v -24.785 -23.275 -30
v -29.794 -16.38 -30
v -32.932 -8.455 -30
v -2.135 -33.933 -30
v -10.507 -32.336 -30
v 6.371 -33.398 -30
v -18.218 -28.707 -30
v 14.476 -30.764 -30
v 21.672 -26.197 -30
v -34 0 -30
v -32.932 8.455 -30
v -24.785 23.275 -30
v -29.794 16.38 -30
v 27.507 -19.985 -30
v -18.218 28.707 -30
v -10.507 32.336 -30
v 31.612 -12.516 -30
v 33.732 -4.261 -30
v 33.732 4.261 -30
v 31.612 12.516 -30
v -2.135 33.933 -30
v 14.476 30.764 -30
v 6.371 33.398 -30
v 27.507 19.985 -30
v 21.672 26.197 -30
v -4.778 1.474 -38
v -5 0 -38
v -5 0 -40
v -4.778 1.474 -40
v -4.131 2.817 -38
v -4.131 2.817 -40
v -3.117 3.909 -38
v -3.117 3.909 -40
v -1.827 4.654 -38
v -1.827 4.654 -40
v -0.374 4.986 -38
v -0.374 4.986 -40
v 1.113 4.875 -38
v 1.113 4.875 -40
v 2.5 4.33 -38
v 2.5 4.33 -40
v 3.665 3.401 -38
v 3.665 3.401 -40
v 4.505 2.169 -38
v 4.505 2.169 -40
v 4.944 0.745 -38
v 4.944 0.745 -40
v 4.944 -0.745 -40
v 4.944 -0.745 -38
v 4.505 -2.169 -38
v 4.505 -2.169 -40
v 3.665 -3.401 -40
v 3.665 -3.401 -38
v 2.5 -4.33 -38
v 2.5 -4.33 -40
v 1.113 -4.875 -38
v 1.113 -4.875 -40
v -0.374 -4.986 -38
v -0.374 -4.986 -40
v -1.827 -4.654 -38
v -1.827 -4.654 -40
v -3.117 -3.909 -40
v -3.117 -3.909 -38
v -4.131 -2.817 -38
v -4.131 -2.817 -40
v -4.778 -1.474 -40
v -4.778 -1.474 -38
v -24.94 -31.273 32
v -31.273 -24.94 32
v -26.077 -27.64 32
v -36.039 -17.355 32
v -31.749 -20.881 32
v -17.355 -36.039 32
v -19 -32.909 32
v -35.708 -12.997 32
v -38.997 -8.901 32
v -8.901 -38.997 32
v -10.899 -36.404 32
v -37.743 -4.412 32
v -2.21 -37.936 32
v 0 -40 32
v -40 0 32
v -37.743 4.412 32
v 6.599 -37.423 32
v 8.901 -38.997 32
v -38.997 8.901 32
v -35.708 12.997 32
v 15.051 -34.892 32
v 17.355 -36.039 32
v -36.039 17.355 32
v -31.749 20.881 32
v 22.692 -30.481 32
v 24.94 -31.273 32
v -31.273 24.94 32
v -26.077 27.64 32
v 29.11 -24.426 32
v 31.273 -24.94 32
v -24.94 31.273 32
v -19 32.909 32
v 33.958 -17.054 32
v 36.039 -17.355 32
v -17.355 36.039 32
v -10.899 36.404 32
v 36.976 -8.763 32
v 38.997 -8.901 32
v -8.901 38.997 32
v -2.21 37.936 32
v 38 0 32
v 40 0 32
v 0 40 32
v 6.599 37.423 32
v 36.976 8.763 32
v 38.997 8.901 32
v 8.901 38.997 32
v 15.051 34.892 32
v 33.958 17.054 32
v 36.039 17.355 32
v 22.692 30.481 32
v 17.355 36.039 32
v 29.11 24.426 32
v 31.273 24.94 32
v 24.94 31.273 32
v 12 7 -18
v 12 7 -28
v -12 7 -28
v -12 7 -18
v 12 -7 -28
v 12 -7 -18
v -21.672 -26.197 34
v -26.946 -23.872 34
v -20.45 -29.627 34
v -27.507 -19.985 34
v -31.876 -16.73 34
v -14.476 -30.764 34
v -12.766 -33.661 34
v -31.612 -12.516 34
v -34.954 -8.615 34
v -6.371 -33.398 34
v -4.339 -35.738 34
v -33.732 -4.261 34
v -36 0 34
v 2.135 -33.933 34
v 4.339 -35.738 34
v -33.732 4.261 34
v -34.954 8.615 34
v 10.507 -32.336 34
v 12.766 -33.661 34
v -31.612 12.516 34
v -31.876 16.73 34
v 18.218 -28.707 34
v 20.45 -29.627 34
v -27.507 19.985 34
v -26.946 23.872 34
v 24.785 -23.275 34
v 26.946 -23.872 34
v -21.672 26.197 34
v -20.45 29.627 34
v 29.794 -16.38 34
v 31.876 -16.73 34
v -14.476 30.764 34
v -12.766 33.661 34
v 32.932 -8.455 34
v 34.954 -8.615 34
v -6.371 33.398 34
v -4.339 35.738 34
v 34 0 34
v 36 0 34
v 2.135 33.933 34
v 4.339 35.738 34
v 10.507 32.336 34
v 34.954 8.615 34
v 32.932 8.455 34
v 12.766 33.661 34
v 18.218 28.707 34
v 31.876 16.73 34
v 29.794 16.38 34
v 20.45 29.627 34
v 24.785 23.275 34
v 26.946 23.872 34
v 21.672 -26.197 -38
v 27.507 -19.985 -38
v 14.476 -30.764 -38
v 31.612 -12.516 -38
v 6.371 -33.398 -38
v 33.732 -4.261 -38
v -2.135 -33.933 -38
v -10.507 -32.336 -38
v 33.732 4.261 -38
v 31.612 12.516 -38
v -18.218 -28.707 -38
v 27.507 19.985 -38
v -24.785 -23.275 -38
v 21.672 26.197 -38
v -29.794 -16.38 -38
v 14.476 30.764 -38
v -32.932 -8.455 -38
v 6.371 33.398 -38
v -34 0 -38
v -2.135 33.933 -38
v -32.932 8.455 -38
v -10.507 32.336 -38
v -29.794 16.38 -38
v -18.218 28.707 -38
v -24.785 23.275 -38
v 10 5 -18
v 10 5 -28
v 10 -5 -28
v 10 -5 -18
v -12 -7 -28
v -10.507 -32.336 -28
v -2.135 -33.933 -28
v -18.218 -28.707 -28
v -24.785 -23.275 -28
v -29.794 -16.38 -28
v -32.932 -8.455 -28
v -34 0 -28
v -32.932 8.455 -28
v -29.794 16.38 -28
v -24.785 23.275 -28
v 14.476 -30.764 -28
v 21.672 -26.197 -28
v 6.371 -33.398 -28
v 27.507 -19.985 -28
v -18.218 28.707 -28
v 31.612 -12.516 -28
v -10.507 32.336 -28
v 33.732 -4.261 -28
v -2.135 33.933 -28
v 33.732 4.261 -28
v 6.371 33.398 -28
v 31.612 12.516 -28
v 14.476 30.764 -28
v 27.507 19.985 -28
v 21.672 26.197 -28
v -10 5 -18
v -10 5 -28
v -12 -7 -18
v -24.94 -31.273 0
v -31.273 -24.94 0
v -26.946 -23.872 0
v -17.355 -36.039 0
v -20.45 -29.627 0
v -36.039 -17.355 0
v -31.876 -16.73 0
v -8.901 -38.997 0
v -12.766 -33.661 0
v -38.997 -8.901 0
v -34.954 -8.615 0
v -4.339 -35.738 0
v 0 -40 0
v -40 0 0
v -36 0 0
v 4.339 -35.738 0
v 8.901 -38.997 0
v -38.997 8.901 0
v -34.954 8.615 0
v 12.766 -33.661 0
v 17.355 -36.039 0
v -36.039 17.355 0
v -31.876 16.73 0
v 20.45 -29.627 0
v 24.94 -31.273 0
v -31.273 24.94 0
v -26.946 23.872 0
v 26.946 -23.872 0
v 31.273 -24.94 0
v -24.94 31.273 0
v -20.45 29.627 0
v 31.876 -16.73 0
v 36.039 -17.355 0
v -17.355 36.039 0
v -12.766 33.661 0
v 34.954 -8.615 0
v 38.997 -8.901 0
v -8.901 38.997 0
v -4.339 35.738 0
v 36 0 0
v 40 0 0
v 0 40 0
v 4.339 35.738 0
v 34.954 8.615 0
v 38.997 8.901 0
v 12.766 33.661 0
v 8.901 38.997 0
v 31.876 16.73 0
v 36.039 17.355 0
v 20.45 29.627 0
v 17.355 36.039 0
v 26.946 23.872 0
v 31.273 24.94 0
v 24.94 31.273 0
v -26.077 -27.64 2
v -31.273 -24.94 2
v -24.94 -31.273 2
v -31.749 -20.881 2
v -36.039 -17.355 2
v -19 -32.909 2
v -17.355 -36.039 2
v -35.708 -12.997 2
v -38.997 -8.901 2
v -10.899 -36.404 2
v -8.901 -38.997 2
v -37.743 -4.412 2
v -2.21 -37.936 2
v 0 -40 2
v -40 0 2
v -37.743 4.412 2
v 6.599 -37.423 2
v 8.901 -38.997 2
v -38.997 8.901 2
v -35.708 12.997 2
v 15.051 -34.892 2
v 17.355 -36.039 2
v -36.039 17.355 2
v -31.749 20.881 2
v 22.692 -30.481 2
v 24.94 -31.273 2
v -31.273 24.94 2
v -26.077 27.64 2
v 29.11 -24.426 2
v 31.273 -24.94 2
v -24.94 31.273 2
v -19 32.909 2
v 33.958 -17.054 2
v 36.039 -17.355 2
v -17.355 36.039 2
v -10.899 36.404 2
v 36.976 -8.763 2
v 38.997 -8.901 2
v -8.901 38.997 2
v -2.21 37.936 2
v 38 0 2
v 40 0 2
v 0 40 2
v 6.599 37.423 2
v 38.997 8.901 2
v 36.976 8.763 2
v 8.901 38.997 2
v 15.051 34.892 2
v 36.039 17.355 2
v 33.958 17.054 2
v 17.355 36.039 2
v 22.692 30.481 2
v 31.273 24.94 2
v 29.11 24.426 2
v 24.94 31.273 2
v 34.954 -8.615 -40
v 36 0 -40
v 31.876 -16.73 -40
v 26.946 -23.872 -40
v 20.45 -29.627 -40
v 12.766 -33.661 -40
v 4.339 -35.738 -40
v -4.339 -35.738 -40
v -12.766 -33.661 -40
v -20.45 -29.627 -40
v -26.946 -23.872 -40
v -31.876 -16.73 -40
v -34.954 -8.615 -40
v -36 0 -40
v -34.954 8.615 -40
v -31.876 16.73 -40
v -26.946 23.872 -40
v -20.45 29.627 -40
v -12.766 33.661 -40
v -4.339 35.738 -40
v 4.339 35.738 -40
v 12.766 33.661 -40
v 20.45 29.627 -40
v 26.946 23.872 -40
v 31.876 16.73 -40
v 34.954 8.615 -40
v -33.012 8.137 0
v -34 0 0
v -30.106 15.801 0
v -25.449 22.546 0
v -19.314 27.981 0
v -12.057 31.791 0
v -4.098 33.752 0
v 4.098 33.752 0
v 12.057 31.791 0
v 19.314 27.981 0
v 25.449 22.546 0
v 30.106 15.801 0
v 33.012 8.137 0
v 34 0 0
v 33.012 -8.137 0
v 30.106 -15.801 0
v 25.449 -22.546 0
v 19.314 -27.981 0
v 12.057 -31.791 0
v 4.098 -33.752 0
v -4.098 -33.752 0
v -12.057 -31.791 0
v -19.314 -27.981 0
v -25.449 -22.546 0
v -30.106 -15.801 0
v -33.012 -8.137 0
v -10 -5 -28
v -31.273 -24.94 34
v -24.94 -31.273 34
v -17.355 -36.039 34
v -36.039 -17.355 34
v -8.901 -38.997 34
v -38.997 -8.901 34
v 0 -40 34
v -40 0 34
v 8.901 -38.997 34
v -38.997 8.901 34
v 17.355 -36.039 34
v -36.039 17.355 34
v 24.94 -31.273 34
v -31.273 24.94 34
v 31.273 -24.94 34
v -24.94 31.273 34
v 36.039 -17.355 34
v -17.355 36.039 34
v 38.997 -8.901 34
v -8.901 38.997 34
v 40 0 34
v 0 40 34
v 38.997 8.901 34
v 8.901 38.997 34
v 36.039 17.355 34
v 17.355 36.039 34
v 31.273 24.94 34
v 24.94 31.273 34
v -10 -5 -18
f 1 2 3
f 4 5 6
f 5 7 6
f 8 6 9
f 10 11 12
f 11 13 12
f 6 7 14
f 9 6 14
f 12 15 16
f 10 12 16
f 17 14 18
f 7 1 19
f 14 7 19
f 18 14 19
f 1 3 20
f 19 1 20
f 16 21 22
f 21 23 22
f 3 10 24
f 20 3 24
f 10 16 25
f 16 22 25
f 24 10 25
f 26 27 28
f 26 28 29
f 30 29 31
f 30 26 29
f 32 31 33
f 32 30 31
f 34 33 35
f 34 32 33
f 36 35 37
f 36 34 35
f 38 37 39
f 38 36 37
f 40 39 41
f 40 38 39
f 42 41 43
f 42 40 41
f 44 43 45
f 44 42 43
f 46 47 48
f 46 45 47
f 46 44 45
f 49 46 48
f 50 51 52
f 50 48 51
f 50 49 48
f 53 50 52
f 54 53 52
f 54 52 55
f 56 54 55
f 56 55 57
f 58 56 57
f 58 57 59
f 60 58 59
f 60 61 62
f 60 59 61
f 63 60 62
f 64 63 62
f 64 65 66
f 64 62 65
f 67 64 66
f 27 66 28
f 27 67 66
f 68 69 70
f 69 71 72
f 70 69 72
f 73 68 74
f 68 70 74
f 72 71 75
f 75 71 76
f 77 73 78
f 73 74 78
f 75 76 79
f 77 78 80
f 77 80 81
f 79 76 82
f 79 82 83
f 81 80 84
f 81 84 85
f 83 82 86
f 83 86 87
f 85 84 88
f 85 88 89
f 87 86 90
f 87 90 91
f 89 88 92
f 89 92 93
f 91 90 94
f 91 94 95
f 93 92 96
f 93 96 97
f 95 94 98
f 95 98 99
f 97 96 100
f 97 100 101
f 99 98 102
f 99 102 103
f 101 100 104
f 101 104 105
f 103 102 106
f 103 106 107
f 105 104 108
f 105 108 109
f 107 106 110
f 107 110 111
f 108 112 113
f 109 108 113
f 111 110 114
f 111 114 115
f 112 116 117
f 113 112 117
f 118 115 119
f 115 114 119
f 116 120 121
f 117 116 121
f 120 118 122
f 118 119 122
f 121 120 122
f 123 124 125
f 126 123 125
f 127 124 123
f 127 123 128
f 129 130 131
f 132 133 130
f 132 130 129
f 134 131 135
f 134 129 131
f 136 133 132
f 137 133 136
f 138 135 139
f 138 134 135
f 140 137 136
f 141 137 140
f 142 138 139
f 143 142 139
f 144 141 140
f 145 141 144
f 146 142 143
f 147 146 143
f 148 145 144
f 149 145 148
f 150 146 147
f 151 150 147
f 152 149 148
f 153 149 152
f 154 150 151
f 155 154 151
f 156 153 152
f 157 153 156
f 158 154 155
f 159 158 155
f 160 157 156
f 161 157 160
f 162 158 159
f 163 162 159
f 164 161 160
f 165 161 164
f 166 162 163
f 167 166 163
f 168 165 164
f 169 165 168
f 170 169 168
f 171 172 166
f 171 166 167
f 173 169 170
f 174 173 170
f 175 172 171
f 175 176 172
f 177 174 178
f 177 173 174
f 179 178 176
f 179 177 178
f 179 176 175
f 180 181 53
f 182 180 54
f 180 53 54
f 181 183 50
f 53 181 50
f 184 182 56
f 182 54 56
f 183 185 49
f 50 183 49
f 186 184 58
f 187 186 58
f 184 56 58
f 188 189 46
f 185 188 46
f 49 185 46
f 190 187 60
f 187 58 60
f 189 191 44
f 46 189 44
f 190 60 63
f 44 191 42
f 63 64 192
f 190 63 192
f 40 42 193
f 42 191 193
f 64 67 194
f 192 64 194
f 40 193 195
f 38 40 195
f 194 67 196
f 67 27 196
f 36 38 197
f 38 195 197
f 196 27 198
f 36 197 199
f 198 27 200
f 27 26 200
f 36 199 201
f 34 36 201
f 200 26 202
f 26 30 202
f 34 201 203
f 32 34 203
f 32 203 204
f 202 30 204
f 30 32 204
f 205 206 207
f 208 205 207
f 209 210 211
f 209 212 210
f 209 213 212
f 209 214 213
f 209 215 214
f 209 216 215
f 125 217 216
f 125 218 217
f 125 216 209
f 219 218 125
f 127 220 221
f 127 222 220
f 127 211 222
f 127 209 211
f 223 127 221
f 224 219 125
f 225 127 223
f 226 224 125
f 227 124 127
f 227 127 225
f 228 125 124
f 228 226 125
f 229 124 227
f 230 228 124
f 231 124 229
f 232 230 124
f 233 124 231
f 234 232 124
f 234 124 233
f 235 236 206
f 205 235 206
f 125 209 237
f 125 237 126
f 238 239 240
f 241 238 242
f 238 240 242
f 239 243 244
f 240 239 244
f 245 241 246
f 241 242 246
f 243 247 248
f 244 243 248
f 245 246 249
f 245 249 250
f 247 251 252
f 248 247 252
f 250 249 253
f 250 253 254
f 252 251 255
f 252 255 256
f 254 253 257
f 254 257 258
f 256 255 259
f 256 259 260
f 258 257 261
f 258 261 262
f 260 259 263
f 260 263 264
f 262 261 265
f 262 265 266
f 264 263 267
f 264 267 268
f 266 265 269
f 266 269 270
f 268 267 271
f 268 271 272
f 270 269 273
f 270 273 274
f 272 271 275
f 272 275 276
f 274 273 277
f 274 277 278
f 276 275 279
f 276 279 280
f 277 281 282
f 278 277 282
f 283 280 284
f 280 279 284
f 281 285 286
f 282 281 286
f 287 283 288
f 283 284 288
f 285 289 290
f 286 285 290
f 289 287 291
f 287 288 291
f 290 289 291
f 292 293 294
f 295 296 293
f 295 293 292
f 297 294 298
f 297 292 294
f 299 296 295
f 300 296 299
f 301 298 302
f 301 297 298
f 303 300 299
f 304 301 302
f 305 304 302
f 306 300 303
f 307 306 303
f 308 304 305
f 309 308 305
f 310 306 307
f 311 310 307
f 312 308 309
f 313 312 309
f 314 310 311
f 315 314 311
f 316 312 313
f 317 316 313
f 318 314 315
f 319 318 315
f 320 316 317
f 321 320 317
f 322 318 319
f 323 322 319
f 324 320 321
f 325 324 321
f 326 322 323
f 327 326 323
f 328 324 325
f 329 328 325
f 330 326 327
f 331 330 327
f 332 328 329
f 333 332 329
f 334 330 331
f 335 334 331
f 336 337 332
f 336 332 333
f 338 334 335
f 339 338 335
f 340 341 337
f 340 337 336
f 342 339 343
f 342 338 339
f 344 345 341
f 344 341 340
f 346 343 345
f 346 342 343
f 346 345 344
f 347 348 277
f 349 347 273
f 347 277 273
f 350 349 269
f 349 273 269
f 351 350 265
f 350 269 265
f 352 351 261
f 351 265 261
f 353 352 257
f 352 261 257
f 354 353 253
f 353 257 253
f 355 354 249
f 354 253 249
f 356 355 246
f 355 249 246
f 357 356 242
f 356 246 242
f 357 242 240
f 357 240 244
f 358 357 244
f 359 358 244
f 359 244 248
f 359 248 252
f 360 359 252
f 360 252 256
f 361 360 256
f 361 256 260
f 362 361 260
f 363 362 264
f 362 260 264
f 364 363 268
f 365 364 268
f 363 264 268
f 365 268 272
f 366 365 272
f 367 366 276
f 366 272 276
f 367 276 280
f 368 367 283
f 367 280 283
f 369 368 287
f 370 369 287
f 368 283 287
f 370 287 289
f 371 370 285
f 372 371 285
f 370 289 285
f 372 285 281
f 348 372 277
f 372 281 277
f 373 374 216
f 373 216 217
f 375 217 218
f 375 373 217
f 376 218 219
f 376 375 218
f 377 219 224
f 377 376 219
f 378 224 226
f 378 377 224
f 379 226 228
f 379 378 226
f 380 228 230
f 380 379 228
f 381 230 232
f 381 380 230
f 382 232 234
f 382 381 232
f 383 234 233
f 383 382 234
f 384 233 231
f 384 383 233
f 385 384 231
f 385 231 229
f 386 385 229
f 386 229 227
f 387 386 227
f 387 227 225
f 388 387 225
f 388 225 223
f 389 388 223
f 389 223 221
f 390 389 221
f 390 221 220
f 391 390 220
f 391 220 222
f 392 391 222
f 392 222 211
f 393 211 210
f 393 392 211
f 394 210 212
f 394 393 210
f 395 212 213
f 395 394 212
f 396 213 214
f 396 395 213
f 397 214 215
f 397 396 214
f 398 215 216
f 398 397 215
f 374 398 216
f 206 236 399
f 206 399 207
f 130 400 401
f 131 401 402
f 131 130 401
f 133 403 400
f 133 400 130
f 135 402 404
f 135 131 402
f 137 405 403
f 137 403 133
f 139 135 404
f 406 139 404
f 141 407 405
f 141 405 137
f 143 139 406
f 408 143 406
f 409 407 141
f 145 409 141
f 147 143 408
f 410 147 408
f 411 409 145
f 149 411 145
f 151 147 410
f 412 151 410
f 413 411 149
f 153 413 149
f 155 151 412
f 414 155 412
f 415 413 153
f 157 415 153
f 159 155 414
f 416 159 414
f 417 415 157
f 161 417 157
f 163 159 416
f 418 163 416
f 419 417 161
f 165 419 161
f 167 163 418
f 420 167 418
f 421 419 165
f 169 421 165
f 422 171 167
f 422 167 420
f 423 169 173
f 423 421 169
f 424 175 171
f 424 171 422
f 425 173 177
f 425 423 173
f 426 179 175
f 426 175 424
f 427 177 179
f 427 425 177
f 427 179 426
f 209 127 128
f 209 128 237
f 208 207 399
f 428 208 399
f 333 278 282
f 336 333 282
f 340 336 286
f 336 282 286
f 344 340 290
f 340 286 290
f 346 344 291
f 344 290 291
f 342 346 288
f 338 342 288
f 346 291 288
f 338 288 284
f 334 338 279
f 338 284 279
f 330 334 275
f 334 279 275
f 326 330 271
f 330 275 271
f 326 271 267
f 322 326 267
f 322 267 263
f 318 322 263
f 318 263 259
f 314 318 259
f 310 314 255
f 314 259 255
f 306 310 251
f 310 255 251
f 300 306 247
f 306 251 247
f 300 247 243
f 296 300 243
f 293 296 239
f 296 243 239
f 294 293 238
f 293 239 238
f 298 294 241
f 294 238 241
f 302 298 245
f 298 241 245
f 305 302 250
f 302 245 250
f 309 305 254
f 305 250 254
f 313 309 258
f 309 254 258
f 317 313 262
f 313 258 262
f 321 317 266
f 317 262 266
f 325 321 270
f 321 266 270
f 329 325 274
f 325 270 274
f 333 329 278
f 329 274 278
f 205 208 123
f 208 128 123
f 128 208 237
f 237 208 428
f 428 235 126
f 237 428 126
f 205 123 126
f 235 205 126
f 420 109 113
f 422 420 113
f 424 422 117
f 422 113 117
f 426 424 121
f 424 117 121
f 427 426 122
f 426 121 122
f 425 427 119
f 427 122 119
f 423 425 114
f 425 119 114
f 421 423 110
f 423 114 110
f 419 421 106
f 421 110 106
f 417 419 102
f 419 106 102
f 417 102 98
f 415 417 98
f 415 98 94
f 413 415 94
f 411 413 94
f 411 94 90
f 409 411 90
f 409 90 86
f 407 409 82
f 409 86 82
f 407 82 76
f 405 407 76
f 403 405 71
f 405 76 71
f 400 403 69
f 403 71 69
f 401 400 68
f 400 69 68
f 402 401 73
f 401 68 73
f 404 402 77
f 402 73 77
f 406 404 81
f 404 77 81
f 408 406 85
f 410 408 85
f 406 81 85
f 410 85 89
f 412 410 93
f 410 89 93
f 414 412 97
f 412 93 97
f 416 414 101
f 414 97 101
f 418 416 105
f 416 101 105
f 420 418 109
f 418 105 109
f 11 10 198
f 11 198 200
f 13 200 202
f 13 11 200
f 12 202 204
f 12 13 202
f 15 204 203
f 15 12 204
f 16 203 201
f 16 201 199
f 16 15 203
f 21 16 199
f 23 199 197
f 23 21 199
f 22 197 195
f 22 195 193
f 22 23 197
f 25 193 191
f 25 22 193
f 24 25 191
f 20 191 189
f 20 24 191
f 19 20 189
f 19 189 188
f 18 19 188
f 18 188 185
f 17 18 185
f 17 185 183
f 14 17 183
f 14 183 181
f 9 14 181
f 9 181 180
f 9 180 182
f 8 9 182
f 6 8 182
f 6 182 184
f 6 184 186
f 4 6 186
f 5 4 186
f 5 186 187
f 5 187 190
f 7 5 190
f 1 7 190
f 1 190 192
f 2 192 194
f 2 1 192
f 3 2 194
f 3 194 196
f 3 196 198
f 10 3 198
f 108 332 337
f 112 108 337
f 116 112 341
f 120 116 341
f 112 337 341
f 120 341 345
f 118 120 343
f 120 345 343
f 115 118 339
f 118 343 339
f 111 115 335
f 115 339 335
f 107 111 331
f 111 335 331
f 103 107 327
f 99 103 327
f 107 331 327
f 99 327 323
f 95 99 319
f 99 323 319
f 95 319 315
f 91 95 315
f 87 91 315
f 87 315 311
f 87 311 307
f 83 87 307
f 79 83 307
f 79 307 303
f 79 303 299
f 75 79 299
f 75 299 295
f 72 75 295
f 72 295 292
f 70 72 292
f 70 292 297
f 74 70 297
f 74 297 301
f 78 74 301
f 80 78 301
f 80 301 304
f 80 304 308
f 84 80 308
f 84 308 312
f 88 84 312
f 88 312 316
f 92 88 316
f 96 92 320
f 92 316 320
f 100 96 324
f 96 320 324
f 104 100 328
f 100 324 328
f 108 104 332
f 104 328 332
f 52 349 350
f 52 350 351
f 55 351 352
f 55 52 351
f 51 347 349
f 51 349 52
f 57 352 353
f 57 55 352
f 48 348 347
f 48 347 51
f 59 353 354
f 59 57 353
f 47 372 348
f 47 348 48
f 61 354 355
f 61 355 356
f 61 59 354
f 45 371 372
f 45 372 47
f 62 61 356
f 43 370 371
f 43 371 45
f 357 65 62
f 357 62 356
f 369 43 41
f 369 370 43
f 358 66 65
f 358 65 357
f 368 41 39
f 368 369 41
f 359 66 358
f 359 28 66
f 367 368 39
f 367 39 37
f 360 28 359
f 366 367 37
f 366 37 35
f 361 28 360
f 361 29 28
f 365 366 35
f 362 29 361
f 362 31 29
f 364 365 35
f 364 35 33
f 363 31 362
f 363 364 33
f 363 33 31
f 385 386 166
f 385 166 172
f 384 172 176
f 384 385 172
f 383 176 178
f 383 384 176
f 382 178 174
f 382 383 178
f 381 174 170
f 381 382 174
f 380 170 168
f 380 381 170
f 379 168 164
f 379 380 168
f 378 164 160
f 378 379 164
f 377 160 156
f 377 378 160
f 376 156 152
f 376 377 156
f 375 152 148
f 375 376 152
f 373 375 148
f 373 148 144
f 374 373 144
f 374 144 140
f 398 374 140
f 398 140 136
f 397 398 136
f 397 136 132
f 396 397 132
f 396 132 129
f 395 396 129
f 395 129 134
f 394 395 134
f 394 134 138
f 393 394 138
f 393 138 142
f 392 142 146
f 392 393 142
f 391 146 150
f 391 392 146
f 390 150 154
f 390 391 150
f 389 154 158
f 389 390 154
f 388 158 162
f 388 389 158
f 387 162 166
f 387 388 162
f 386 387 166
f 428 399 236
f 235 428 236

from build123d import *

# Parameters (mm, degrees)
SKETCH_1_R               = 38
SKETCH_1_R_2             = 36
EXTRUDE_1_DEPTH          = 34
EXTRUDE_START            = -2
SKETCH_2_R               = 40
SKETCH_2_R_2             = 38
EXTRUDE_2_DEPTH          = 2
EXTRUDE_START_2          = -34
SKETCH_2_2_R             = 40
SKETCH_2_2_R_2           = 38
EXTRUDE_3_DEPTH          = 2
SKETCH_3_R               = 36
SKETCH_3_R_2             = 34
EXTRUDE_4_DEPTH          = 40
SKETCH_4_R               = 34
EXTRUDE_5_DEPTH          = 2
CUT_EXTRUDE_1_DEPTH      = 94.145048178
CUT_EXTRUDE_1_DEPTH_BACK = 94.145048178
SKETCH_5_R               = 5
EXTRUDE_START_3          = -30
SKETCH_6_R               = 34
EXTRUDE_6_DEPTH          = 2
EXTRUDE_7_DEPTH          = 10
SKETCH_8_R               = 36
SKETCH_8_R_2             = 34
EXTRUDE_9_DEPTH          = 34


with BuildPart() as part:
    # 草图1 → 凸台-拉伸1 (new body)
    with BuildSketch(Plane.XY):
        Circle(SKETCH_1_R)
        Circle(SKETCH_1_R_2, mode=Mode.SUBTRACT)
    extrude(amount=EXTRUDE_1_DEPTH)

    # 草图2 → 凸台-拉伸2 (add)
    with BuildSketch(Plane.XY.offset(34).offset(EXTRUDE_START)):
        Circle(SKETCH_2_R)
        Circle(SKETCH_2_R_2, mode=Mode.SUBTRACT)
    extrude(amount=EXTRUDE_2_DEPTH)

    # 草图2<2> → 凸台-拉伸3 (add)
    with BuildSketch(Plane.XY.offset(34).offset(EXTRUDE_START_2)):
        Circle(SKETCH_2_2_R)
        Circle(SKETCH_2_2_R_2, mode=Mode.SUBTRACT)
    extrude(amount=EXTRUDE_3_DEPTH)



with BuildPart() as body_2:
    # 草图3 → 凸台-拉伸4 (new body)
    with BuildSketch(Plane(origin=(0, 0, 0), x_dir=(-1, 0, 0), z_dir=(0, 0, -1))):
        with Locations(Location((0, 0, 0), (0, 0, 180))):
            Circle(SKETCH_3_R)
        Circle(SKETCH_3_R_2, mode=Mode.SUBTRACT)
    extrude(amount=EXTRUDE_4_DEPTH)

    # 草图4 → 凸台-拉伸5 (add)
    with BuildSketch(Plane(origin=(0, 0, -40), x_dir=(-1, 0, 0), z_dir=(0, 0, -1))):
        Circle(SKETCH_4_R)
    extrude(amount=-EXTRUDE_5_DEPTH)

    # 草图5 → 切除-拉伸1 (cut, two sides: drawn at the far end of the back side and taken through both)
    with BuildSketch(Plane(origin=(0, 0, -40), x_dir=(-1, 0, 0), z_dir=(0, 0, -1)).offset(-CUT_EXTRUDE_1_DEPTH_BACK)):
        Circle(SKETCH_5_R)
    extrude(amount=CUT_EXTRUDE_1_DEPTH + CUT_EXTRUDE_1_DEPTH_BACK, mode=Mode.SUBTRACT)

    # 草图6 → 凸台-拉伸6 (add)
    with BuildSketch(Plane.XY.offset(EXTRUDE_START_3)):
        Circle(SKETCH_6_R)
    extrude(amount=EXTRUDE_6_DEPTH)

    # 草图7 → 凸台-拉伸7 (add)
    with BuildSketch(Plane.XY.offset(-28)):
        Polygon((0, 7), (12, 7), (12, -7), (-12, -7), (-12, 7), align=None)
        Polygon((0, 5), (10, 5), (10, -5), (-10, -5), (-10, 5), align=None, mode=Mode.SUBTRACT)
    extrude(amount=EXTRUDE_7_DEPTH)


with BuildPart() as part_1:
    add(part.part)

    add(body_2.part)  # 凸台-拉伸9 merges body 2
    # 草图8 → 凸台-拉伸9 (add, through all)
    with BuildSketch(Plane.XY):
        Circle(SKETCH_8_R)
        Circle(SKETCH_8_R_2, mode=Mode.SUBTRACT)
    extrude(amount=EXTRUDE_9_DEPTH)


solid = part_1.part
